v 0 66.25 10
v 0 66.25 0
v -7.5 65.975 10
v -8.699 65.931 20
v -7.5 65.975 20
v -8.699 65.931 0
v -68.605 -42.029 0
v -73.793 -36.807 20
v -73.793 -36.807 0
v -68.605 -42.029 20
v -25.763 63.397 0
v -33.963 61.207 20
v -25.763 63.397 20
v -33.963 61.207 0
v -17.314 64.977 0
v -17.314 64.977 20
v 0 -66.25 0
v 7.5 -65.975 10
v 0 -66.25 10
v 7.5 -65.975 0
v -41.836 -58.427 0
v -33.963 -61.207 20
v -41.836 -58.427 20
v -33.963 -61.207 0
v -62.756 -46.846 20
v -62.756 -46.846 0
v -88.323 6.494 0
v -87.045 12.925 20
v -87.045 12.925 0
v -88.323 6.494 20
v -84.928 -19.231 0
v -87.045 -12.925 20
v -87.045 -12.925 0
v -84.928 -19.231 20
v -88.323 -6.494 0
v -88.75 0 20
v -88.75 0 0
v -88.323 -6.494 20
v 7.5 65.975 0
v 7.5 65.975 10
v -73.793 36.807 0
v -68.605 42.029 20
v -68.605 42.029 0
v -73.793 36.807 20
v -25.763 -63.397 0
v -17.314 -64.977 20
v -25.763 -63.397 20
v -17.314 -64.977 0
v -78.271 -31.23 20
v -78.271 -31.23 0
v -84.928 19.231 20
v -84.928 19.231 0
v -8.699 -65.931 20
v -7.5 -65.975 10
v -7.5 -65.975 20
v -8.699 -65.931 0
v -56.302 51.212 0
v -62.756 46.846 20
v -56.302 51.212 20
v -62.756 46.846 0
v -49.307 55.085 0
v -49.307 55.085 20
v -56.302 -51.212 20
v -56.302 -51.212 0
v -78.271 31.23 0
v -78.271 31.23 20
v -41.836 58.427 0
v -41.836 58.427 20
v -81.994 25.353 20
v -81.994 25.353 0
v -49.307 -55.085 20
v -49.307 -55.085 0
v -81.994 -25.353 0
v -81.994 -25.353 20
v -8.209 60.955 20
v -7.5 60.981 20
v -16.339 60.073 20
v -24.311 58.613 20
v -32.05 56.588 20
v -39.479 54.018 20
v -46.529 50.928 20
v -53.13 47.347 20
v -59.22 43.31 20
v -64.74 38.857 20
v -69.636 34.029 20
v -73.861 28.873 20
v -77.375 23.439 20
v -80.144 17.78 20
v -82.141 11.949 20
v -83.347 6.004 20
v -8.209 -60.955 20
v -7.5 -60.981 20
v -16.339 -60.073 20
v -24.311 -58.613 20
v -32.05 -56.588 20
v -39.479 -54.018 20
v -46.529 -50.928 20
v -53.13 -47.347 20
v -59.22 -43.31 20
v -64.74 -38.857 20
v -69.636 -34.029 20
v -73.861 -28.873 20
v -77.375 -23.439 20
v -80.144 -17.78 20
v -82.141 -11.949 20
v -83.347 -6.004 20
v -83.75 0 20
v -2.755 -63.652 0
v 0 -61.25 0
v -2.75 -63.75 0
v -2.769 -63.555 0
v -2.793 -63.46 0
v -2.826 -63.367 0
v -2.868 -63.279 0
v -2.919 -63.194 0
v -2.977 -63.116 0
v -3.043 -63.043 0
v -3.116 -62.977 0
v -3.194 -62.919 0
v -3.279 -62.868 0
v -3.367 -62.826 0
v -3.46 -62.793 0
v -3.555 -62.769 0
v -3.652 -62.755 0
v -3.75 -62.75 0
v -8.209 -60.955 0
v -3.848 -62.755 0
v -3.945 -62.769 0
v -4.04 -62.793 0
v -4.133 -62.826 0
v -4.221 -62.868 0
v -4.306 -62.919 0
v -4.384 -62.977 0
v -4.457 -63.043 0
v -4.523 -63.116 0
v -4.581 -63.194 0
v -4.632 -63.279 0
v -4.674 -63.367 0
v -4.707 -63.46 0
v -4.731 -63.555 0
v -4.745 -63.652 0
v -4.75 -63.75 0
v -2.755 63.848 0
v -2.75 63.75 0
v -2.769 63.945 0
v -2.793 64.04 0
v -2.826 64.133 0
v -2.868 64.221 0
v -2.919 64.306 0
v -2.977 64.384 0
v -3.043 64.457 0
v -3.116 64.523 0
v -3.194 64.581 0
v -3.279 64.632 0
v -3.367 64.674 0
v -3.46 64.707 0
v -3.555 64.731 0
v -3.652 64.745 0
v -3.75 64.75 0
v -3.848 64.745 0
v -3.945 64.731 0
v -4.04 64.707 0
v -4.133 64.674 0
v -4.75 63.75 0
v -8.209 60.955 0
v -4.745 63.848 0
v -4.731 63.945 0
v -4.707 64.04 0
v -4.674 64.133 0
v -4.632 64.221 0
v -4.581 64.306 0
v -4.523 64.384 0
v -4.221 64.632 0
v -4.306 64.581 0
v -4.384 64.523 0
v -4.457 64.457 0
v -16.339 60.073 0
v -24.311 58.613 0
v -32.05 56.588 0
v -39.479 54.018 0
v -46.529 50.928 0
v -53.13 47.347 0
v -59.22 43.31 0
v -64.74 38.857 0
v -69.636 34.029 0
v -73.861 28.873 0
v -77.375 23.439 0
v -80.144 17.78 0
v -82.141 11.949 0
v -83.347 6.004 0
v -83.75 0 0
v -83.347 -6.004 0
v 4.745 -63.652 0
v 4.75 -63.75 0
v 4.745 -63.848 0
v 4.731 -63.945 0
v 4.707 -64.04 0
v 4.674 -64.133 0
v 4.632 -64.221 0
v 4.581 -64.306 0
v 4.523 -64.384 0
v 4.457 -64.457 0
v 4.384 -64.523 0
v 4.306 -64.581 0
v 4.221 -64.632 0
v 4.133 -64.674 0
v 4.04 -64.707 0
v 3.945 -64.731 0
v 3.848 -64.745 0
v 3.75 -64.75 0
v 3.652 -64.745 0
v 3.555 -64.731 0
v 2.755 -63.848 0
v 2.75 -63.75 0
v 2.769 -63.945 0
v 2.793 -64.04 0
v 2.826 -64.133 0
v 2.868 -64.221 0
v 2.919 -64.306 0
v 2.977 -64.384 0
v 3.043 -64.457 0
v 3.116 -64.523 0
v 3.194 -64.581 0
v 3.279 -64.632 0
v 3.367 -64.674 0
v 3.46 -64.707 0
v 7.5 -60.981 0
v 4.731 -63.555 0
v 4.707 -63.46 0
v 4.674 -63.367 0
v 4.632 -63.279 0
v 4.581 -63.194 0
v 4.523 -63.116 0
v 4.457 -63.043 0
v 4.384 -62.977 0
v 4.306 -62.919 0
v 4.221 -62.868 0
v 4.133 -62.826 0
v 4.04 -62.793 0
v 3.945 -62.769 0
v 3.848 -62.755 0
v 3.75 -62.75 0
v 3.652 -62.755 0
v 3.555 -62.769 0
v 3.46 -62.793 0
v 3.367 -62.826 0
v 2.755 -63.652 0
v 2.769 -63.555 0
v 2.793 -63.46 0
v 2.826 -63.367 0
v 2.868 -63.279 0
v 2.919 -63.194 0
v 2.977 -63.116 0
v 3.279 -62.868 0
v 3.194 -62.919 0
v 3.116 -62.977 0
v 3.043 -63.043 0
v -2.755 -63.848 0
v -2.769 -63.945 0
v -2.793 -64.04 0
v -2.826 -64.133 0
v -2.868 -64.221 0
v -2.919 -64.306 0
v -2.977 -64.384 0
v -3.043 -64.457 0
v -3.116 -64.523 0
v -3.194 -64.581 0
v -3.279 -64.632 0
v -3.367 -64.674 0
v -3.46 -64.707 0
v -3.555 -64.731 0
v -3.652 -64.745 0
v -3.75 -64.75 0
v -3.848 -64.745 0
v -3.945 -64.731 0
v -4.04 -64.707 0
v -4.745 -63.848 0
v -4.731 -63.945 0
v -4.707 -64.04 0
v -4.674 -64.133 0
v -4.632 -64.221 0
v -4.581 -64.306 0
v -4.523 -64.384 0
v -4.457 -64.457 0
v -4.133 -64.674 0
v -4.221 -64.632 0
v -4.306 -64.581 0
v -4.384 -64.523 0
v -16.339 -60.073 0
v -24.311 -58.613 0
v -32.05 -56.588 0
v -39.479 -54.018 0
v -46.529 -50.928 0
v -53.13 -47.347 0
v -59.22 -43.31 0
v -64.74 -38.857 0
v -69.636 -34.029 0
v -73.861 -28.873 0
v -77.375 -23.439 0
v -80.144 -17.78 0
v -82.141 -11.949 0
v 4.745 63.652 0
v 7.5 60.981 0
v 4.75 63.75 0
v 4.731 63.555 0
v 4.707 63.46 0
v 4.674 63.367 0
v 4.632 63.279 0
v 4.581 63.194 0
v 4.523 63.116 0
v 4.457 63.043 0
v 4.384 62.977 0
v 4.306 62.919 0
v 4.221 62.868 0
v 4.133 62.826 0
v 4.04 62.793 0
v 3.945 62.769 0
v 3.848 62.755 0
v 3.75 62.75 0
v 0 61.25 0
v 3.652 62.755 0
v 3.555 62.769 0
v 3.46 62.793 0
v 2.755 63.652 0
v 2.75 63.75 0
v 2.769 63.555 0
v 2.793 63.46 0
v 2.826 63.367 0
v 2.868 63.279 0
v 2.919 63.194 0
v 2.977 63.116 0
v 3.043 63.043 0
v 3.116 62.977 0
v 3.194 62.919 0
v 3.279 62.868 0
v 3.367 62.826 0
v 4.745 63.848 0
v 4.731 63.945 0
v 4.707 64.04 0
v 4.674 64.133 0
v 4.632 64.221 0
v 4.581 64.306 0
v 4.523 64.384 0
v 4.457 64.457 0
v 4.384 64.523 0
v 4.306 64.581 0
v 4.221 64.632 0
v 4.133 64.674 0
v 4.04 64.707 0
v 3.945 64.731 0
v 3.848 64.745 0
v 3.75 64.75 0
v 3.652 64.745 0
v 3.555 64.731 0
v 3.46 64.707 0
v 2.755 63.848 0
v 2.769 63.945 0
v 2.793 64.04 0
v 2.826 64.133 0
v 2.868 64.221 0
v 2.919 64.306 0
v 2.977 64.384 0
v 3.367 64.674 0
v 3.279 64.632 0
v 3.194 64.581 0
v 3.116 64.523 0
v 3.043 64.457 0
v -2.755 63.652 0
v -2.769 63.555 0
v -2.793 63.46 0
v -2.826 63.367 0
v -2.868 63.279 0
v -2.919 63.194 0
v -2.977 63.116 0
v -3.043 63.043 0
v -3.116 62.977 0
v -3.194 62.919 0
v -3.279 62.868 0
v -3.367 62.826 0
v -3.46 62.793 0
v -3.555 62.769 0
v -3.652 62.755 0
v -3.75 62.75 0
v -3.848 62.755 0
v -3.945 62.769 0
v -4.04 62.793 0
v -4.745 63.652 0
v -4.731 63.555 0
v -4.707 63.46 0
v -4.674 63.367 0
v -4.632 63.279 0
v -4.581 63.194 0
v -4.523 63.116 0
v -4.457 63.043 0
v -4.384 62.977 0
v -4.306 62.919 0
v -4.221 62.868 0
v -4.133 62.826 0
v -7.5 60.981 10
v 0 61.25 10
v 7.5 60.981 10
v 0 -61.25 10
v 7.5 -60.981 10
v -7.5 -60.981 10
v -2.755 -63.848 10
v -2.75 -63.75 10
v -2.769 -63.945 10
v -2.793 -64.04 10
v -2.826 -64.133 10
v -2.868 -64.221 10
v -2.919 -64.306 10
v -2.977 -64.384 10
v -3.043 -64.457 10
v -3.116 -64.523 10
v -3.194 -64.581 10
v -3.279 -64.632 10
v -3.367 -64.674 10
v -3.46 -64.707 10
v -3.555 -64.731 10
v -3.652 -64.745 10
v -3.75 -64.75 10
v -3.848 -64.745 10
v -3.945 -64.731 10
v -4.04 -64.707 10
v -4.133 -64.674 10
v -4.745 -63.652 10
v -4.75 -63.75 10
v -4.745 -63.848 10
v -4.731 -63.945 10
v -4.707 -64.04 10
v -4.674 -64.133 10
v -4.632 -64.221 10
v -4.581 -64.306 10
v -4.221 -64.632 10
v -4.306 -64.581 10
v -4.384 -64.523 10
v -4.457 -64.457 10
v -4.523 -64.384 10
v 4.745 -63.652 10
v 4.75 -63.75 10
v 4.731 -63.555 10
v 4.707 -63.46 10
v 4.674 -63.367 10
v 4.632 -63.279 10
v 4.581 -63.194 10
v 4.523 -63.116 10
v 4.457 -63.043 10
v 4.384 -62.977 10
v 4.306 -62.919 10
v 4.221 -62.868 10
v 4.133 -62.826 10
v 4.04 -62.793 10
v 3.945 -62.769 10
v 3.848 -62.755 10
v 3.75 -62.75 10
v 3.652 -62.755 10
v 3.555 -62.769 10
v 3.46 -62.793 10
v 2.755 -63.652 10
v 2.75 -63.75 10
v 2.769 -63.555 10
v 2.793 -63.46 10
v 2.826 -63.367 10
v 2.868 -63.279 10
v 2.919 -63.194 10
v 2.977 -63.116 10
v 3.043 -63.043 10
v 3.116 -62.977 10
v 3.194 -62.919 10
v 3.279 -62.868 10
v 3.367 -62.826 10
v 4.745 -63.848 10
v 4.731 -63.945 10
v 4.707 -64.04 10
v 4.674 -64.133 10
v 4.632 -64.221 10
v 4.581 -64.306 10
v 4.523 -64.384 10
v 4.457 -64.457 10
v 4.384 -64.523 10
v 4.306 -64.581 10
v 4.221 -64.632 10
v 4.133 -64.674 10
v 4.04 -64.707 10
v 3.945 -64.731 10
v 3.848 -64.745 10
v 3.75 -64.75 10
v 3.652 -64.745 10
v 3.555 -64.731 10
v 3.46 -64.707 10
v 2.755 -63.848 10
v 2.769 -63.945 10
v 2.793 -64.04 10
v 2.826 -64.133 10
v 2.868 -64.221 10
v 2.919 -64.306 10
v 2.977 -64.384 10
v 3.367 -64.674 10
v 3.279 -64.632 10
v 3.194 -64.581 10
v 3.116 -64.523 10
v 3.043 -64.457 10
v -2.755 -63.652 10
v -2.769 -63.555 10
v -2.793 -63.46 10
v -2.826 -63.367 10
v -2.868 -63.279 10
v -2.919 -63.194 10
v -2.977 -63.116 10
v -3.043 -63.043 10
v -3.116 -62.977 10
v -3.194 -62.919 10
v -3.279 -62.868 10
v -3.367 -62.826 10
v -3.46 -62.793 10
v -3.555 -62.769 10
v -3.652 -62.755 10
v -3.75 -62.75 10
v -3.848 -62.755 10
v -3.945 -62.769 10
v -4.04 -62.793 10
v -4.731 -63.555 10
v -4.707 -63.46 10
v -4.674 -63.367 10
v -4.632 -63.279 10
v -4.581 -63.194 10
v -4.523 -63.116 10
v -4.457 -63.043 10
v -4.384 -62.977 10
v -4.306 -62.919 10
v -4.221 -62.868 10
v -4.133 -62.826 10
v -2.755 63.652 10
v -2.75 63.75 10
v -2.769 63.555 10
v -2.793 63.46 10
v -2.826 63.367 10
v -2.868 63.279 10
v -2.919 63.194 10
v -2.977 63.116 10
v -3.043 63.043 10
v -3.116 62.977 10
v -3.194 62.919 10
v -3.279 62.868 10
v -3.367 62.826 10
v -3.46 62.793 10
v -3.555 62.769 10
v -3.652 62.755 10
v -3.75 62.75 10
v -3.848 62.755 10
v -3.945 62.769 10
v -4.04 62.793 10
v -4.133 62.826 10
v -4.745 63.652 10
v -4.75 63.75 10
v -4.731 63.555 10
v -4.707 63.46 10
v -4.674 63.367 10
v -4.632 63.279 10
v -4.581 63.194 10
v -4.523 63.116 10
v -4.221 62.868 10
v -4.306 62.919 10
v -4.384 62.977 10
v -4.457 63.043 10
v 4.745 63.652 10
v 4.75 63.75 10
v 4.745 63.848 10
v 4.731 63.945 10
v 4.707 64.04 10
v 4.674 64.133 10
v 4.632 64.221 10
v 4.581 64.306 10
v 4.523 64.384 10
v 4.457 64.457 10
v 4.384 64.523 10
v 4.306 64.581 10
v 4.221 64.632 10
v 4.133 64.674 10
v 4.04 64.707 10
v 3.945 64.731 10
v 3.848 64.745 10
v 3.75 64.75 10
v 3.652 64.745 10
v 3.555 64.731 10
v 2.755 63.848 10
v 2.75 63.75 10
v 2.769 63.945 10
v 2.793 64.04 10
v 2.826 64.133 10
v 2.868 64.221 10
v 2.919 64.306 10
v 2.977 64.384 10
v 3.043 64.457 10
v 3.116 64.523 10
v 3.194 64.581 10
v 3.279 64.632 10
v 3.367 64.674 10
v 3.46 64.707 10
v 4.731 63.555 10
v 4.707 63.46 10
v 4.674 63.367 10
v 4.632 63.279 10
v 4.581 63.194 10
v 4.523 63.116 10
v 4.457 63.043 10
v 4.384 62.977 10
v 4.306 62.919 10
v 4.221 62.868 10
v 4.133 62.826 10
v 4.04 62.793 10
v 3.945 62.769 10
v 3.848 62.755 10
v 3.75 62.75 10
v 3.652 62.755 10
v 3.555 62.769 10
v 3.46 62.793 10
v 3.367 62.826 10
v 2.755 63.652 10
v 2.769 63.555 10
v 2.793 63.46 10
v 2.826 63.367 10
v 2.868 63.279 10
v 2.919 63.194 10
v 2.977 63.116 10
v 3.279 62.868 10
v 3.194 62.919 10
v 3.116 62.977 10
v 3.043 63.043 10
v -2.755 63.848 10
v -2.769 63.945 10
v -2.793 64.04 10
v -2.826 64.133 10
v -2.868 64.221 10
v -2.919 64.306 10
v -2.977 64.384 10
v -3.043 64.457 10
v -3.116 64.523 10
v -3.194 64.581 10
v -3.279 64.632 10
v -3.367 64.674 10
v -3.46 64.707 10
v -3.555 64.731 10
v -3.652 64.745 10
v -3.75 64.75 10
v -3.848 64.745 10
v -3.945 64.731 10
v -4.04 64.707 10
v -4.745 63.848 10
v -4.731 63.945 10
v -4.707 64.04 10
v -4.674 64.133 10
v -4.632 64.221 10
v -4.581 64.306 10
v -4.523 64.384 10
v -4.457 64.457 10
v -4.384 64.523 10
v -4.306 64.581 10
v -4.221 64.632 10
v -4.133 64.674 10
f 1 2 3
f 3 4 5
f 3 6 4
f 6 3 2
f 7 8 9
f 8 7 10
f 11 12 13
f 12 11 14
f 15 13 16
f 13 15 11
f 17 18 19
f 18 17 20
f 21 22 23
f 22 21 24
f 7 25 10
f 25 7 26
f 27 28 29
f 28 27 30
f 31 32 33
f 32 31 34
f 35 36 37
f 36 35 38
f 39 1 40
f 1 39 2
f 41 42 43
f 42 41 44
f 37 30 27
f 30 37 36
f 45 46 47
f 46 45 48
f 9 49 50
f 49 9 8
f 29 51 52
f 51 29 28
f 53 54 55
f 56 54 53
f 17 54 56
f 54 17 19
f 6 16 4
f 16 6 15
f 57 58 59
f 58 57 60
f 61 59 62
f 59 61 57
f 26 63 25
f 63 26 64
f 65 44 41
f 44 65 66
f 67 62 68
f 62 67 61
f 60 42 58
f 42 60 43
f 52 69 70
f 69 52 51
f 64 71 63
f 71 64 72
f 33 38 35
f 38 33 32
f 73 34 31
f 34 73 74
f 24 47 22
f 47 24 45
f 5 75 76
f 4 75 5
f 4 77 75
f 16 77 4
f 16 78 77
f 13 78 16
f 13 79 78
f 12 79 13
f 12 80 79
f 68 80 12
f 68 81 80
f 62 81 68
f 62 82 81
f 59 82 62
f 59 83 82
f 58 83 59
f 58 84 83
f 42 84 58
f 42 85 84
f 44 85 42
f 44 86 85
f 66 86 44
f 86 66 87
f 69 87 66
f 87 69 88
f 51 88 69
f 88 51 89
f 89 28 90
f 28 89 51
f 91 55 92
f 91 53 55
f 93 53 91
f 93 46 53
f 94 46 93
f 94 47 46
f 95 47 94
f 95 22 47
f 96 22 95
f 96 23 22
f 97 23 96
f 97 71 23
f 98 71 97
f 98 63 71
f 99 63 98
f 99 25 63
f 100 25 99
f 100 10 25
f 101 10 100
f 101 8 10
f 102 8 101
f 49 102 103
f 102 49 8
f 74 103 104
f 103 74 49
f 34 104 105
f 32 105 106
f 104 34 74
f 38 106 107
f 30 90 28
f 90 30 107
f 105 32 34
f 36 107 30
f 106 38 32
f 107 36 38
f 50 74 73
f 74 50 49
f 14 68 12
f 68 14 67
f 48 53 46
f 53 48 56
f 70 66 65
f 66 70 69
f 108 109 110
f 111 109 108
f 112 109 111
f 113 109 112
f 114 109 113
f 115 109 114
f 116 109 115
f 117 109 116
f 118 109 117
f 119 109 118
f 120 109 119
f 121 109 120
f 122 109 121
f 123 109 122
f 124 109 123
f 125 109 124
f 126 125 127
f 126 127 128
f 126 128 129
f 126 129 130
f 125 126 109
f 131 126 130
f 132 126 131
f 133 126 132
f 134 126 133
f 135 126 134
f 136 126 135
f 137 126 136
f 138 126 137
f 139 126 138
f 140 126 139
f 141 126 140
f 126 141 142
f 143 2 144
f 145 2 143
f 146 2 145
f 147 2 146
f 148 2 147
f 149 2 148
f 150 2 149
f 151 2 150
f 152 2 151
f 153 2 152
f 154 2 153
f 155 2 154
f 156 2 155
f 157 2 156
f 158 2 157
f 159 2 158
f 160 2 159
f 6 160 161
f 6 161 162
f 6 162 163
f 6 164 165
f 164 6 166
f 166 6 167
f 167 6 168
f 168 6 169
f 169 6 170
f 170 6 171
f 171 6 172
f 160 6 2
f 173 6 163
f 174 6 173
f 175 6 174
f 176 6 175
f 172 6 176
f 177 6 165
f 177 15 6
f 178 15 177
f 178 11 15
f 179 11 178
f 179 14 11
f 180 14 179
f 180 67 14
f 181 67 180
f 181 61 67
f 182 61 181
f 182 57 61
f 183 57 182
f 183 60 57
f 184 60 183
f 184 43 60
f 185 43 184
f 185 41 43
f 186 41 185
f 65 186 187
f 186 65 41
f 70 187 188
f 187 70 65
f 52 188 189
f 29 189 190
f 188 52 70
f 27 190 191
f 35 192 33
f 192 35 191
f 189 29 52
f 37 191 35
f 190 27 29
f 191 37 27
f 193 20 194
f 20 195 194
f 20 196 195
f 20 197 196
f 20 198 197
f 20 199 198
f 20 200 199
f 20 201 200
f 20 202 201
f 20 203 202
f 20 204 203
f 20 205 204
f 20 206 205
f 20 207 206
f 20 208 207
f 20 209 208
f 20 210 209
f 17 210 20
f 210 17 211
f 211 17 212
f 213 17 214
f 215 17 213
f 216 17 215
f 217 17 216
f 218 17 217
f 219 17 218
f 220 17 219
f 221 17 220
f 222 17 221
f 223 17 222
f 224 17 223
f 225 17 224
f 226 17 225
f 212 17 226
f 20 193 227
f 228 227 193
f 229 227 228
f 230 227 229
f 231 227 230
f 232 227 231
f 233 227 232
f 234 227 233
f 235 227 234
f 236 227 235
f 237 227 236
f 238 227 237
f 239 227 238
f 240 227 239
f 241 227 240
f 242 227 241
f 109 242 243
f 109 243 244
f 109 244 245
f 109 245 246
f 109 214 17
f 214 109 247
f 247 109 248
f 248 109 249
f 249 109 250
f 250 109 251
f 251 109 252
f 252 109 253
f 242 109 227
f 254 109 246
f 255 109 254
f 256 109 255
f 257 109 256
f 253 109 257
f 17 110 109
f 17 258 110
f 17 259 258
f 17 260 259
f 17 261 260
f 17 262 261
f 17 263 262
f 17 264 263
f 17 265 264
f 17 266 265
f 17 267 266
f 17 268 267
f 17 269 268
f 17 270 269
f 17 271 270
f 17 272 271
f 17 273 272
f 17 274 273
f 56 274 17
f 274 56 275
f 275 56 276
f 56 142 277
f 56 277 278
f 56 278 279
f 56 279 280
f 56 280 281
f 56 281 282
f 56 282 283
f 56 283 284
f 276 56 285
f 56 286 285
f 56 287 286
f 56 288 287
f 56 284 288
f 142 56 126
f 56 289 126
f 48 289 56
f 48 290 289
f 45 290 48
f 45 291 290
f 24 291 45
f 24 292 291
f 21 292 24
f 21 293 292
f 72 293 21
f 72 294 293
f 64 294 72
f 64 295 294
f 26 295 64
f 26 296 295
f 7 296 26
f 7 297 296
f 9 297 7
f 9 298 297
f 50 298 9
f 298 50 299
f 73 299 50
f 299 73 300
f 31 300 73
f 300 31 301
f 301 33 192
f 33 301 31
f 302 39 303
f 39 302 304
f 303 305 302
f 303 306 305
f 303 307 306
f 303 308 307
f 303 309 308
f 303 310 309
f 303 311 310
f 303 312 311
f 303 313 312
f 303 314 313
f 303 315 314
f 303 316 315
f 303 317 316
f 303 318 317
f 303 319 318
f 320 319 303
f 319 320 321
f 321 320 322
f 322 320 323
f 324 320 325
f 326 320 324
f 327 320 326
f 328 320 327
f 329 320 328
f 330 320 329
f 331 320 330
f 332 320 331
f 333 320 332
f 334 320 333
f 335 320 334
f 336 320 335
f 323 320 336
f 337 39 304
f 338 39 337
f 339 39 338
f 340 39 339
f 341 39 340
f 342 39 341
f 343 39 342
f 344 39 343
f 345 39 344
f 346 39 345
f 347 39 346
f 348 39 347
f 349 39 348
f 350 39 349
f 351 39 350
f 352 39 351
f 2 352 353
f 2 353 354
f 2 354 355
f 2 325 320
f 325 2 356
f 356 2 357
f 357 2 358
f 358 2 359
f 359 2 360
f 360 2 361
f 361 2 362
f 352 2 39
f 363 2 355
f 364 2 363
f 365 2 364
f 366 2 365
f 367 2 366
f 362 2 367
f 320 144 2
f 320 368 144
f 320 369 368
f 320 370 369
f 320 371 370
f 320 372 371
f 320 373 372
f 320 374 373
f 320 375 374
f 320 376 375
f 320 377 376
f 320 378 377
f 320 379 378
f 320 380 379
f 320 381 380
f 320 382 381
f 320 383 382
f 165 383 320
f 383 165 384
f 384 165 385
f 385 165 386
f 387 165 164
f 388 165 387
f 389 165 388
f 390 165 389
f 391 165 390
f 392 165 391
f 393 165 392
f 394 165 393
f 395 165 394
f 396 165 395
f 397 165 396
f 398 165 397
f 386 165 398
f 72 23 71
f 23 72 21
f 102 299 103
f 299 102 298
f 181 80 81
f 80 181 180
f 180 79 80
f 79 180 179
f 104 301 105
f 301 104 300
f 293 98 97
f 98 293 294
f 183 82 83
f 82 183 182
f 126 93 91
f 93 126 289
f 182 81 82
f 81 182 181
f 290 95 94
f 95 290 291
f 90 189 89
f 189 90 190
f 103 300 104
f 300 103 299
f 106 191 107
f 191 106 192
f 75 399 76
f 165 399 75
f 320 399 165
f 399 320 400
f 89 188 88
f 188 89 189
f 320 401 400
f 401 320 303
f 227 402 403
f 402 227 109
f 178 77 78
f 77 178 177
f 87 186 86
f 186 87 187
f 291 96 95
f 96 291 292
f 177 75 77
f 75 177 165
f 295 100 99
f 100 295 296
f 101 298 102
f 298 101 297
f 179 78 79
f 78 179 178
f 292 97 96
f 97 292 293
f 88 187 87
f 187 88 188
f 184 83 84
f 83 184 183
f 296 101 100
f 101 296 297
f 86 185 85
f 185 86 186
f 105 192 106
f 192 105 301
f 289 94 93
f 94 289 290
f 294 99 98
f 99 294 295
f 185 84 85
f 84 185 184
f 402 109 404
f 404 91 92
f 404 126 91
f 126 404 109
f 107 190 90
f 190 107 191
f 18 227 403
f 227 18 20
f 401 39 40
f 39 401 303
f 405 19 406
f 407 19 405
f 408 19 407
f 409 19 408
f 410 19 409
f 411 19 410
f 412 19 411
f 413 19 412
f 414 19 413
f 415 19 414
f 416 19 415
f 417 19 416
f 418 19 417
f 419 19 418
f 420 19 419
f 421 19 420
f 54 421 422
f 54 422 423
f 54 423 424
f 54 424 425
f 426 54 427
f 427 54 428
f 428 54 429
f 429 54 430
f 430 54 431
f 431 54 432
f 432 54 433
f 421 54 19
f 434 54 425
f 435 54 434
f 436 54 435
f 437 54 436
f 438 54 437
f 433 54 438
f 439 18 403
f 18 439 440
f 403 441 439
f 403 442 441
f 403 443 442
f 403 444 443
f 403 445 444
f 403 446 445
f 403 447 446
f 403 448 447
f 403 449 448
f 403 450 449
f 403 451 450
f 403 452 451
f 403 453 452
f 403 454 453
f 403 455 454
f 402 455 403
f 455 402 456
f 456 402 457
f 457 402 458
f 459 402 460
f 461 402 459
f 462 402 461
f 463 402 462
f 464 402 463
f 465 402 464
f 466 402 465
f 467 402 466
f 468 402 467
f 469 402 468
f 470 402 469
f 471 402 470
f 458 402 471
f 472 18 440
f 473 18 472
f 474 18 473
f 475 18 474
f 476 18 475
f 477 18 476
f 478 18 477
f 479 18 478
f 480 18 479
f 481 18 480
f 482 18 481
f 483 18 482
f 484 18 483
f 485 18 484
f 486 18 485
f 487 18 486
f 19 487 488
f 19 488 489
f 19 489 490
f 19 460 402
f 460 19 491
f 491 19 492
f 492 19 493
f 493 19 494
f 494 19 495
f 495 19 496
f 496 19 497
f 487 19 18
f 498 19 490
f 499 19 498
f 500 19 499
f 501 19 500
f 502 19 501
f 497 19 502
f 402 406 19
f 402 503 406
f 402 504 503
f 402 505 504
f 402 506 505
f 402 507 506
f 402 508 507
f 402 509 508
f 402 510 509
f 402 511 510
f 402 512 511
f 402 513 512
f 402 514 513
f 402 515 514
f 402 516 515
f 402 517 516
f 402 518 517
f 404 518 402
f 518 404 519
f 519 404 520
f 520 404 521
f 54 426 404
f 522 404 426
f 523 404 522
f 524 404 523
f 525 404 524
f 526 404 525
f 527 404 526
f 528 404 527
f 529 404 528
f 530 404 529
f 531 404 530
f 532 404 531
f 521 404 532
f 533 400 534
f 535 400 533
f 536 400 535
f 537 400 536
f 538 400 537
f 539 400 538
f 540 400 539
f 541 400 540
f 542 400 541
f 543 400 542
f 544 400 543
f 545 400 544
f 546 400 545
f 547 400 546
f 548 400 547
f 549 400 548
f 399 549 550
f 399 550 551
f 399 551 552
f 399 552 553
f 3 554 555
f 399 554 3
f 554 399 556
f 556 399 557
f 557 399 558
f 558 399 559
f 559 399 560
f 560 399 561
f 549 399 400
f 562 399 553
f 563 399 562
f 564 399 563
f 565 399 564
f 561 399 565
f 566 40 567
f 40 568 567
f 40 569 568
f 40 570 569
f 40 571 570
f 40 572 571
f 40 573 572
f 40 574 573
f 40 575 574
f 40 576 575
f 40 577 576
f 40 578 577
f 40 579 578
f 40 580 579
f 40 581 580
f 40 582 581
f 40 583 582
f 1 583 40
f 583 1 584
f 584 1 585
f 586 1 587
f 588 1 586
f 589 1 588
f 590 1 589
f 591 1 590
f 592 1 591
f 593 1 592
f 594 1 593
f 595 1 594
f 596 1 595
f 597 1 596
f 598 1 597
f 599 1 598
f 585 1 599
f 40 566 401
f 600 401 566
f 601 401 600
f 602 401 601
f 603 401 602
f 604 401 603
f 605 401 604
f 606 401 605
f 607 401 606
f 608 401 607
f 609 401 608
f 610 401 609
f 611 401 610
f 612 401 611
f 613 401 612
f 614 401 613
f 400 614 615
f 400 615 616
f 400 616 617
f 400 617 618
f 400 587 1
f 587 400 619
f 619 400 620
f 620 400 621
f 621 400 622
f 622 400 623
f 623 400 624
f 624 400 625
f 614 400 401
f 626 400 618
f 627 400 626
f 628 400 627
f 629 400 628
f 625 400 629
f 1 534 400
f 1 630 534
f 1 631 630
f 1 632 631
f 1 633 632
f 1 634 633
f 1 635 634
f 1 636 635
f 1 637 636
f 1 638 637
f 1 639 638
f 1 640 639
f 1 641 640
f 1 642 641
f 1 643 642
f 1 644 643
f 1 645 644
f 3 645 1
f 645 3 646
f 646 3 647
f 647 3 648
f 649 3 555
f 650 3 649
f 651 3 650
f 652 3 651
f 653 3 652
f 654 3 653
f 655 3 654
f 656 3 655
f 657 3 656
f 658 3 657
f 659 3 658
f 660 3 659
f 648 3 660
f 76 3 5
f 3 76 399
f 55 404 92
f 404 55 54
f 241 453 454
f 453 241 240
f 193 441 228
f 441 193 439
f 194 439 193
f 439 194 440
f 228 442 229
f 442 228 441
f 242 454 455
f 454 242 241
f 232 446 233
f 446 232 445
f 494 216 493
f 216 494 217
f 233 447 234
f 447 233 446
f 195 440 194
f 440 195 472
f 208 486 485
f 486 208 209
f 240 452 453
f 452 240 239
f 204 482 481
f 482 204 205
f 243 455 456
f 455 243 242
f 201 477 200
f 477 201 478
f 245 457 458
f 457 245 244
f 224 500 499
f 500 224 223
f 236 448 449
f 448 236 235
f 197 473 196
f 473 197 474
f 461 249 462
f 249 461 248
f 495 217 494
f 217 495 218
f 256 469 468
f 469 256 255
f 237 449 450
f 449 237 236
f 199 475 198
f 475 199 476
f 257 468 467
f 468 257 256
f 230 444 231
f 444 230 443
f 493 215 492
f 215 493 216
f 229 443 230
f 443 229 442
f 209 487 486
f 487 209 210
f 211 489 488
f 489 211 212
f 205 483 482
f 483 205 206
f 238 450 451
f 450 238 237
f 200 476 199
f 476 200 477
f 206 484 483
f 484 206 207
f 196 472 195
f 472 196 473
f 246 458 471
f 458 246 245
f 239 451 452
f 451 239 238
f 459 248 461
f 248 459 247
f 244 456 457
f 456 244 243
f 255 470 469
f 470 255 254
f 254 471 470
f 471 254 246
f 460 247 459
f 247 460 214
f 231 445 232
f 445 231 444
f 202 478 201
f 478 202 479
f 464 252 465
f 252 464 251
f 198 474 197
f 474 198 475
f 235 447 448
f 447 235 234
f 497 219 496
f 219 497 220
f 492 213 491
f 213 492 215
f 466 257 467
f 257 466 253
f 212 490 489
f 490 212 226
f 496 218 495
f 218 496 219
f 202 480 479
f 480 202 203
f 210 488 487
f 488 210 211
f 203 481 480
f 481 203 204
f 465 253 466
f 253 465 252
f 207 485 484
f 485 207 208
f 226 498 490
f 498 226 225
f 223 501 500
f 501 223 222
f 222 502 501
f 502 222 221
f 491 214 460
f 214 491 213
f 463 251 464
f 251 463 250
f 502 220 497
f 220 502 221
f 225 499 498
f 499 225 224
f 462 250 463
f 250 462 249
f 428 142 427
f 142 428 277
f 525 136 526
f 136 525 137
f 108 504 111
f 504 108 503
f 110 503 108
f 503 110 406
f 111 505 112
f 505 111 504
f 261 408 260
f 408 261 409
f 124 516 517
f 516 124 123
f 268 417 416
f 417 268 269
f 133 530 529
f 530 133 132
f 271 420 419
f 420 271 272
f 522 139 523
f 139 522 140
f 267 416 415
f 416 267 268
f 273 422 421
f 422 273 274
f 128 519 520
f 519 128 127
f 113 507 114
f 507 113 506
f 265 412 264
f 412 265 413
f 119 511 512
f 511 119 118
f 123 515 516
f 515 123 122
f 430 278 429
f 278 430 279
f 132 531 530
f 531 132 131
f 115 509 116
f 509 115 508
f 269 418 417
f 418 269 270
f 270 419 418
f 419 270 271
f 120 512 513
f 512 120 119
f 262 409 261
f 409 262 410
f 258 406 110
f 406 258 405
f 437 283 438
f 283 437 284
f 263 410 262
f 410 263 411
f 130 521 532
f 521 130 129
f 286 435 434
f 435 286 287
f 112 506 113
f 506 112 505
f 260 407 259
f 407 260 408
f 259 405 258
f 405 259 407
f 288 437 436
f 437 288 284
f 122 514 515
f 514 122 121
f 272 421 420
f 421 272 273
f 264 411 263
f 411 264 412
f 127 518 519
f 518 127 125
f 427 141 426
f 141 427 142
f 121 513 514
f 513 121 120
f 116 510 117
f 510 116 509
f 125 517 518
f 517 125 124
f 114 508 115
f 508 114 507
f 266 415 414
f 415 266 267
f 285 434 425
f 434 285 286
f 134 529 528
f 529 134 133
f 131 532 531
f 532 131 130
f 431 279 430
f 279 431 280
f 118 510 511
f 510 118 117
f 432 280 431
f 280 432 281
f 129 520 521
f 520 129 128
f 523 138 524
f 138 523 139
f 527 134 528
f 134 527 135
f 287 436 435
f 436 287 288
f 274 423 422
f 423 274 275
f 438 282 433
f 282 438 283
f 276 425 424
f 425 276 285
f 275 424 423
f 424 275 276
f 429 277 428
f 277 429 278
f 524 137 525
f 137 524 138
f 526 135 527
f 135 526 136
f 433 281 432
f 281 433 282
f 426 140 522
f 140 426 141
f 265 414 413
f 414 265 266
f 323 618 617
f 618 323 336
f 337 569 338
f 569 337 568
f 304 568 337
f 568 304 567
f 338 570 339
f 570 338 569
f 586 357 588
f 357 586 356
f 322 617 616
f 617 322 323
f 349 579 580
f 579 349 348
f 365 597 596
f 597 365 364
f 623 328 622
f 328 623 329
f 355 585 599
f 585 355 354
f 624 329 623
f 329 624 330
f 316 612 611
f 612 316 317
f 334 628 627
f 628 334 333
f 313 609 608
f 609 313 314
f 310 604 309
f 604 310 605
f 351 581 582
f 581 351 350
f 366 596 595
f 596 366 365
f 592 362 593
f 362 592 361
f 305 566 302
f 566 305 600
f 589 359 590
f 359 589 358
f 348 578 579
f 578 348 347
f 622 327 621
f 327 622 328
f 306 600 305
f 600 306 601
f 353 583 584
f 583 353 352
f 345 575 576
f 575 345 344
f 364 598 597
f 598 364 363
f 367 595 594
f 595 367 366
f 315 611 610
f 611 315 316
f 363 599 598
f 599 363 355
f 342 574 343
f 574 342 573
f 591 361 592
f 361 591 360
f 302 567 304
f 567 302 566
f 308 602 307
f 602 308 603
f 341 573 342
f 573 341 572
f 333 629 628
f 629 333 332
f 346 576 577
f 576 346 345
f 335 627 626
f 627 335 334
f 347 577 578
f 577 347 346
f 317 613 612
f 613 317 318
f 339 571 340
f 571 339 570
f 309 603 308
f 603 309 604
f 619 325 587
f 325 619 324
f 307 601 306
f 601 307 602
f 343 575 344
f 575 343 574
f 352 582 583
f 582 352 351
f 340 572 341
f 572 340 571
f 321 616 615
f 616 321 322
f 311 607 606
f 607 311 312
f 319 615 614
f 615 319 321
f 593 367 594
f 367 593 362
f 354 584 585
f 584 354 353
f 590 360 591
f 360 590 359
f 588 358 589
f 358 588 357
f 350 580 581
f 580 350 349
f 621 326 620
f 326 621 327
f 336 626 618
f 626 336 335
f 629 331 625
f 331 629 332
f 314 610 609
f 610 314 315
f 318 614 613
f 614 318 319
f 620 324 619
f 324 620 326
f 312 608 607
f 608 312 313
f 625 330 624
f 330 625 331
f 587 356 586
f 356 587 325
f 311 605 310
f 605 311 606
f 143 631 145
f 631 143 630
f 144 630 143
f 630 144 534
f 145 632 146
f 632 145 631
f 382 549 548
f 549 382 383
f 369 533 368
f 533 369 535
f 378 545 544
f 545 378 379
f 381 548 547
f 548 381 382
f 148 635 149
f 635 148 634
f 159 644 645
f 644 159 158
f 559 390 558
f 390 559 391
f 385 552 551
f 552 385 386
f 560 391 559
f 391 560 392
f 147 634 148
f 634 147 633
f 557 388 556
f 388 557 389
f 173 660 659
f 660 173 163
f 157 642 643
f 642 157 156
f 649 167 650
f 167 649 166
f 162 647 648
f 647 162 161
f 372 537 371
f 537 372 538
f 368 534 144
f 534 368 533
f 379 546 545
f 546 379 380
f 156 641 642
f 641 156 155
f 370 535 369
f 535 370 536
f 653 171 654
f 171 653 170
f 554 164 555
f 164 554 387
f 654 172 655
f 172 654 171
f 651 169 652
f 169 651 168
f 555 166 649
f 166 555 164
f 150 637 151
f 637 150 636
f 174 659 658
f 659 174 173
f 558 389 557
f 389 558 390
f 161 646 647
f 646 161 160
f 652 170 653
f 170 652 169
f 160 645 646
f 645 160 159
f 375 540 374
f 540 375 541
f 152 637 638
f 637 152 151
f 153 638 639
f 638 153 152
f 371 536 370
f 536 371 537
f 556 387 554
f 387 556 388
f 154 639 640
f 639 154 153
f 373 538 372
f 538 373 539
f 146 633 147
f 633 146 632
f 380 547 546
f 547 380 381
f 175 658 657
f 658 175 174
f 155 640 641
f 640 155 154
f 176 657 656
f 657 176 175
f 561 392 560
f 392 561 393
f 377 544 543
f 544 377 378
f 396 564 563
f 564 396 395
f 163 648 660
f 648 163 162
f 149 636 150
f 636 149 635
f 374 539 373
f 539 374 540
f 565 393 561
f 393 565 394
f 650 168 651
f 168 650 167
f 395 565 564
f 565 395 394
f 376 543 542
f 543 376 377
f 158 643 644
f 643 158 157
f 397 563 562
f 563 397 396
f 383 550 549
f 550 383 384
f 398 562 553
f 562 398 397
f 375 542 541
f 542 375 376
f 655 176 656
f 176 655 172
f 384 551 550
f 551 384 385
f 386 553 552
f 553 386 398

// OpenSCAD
// file: formwork_oval.scad
$fn = 64;

/* elliptical_cylinder BEGIN */
module elliptical_cylinder(major, minor, height) {
    scale([major / 2, minor / 2, 1])
        cylinder(d = 2, h = height);
}
/* elliptical_cylinder END */

/* elliptical_formwork BEGIN */
module elliptical_formwork(outer_major, outer_minor, wall, height) {
    difference_shape_height = height * 2;

    difference() {
        elliptical_cylinder(outer_major + 2 * wall, outer_minor + 2 * wall, height);
        translate(
            [
            0,
            0,
                -difference_shape_height / 4
            ]
        ) {
            elliptical_cylinder(outer_major, outer_minor, difference_shape_height);
        }
    }
}
/* elliptical_formwork END */

// elliptical_formwork_with_cutouts BEGIN
module elliptical_formwork_with_cutouts(outer_major, outer_minor, wall, height, key) {
    difference() {
        difference() {
            difference_shape_height = height * 2;
            color("green") elliptical_formwork(outer_major, outer_minor, wall, height);

            translate(
                [
                        outer_minor / 2 + key / 2,
                0,
                    difference_shape_height / 4
                ]
            ) {
                cube(
                    [outer_minor, outer_major, difference_shape_height],
                center = true
                );
            }
        }

        translate(
            [
                0,
            0,
                    height / 2 + height / 4
            ]
        ) {
            cube(
                [key, outer_minor + wall * 2, height / 2],
            center = true
            );
        }

        translate(
            [
                key / 4,
                    -outer_minor / 2 - wall / 2,
                height / 4
            ]
        ) {
            #cylinder(
            height,
            1,
            1,
            center = true
            );
        }

        translate(
            [
                    +key / 4 - key / 2,
                    -outer_minor / 2 - wall / 2,
                height / 4
            ]
        ) {
            #cylinder(
            height,
            1,
            1,
            center = true
            );
        }

        translate(
            [
                key / 4,
                    outer_minor / 2 + wall / 2,
                height / 4
            ]
        ) {
            #cylinder(
            height,
            1,
            1,
            center = true
            );
        }

        translate(
            [
                    +key / 4 - key / 2,
                    outer_minor / 2 + wall / 2,
                height / 4
            ]
        ) {
            #cylinder(
            height,
            1,
            1,
            center = true
            );
        }
    }
}
// elliptical_formwork_with_cutouts END
// main file
use <formwork_oval.scad>;

$fn = 256;

/* render BEGIN */
key_width = 15;
radius_small = 122.5;
wall_thickness = 5;
radius_big = 167.5;
wall_height = 20;

elliptical_formwork_with_cutouts(radius_big, radius_small, wall_thickness, wall_height, key_width);
/* render END */
